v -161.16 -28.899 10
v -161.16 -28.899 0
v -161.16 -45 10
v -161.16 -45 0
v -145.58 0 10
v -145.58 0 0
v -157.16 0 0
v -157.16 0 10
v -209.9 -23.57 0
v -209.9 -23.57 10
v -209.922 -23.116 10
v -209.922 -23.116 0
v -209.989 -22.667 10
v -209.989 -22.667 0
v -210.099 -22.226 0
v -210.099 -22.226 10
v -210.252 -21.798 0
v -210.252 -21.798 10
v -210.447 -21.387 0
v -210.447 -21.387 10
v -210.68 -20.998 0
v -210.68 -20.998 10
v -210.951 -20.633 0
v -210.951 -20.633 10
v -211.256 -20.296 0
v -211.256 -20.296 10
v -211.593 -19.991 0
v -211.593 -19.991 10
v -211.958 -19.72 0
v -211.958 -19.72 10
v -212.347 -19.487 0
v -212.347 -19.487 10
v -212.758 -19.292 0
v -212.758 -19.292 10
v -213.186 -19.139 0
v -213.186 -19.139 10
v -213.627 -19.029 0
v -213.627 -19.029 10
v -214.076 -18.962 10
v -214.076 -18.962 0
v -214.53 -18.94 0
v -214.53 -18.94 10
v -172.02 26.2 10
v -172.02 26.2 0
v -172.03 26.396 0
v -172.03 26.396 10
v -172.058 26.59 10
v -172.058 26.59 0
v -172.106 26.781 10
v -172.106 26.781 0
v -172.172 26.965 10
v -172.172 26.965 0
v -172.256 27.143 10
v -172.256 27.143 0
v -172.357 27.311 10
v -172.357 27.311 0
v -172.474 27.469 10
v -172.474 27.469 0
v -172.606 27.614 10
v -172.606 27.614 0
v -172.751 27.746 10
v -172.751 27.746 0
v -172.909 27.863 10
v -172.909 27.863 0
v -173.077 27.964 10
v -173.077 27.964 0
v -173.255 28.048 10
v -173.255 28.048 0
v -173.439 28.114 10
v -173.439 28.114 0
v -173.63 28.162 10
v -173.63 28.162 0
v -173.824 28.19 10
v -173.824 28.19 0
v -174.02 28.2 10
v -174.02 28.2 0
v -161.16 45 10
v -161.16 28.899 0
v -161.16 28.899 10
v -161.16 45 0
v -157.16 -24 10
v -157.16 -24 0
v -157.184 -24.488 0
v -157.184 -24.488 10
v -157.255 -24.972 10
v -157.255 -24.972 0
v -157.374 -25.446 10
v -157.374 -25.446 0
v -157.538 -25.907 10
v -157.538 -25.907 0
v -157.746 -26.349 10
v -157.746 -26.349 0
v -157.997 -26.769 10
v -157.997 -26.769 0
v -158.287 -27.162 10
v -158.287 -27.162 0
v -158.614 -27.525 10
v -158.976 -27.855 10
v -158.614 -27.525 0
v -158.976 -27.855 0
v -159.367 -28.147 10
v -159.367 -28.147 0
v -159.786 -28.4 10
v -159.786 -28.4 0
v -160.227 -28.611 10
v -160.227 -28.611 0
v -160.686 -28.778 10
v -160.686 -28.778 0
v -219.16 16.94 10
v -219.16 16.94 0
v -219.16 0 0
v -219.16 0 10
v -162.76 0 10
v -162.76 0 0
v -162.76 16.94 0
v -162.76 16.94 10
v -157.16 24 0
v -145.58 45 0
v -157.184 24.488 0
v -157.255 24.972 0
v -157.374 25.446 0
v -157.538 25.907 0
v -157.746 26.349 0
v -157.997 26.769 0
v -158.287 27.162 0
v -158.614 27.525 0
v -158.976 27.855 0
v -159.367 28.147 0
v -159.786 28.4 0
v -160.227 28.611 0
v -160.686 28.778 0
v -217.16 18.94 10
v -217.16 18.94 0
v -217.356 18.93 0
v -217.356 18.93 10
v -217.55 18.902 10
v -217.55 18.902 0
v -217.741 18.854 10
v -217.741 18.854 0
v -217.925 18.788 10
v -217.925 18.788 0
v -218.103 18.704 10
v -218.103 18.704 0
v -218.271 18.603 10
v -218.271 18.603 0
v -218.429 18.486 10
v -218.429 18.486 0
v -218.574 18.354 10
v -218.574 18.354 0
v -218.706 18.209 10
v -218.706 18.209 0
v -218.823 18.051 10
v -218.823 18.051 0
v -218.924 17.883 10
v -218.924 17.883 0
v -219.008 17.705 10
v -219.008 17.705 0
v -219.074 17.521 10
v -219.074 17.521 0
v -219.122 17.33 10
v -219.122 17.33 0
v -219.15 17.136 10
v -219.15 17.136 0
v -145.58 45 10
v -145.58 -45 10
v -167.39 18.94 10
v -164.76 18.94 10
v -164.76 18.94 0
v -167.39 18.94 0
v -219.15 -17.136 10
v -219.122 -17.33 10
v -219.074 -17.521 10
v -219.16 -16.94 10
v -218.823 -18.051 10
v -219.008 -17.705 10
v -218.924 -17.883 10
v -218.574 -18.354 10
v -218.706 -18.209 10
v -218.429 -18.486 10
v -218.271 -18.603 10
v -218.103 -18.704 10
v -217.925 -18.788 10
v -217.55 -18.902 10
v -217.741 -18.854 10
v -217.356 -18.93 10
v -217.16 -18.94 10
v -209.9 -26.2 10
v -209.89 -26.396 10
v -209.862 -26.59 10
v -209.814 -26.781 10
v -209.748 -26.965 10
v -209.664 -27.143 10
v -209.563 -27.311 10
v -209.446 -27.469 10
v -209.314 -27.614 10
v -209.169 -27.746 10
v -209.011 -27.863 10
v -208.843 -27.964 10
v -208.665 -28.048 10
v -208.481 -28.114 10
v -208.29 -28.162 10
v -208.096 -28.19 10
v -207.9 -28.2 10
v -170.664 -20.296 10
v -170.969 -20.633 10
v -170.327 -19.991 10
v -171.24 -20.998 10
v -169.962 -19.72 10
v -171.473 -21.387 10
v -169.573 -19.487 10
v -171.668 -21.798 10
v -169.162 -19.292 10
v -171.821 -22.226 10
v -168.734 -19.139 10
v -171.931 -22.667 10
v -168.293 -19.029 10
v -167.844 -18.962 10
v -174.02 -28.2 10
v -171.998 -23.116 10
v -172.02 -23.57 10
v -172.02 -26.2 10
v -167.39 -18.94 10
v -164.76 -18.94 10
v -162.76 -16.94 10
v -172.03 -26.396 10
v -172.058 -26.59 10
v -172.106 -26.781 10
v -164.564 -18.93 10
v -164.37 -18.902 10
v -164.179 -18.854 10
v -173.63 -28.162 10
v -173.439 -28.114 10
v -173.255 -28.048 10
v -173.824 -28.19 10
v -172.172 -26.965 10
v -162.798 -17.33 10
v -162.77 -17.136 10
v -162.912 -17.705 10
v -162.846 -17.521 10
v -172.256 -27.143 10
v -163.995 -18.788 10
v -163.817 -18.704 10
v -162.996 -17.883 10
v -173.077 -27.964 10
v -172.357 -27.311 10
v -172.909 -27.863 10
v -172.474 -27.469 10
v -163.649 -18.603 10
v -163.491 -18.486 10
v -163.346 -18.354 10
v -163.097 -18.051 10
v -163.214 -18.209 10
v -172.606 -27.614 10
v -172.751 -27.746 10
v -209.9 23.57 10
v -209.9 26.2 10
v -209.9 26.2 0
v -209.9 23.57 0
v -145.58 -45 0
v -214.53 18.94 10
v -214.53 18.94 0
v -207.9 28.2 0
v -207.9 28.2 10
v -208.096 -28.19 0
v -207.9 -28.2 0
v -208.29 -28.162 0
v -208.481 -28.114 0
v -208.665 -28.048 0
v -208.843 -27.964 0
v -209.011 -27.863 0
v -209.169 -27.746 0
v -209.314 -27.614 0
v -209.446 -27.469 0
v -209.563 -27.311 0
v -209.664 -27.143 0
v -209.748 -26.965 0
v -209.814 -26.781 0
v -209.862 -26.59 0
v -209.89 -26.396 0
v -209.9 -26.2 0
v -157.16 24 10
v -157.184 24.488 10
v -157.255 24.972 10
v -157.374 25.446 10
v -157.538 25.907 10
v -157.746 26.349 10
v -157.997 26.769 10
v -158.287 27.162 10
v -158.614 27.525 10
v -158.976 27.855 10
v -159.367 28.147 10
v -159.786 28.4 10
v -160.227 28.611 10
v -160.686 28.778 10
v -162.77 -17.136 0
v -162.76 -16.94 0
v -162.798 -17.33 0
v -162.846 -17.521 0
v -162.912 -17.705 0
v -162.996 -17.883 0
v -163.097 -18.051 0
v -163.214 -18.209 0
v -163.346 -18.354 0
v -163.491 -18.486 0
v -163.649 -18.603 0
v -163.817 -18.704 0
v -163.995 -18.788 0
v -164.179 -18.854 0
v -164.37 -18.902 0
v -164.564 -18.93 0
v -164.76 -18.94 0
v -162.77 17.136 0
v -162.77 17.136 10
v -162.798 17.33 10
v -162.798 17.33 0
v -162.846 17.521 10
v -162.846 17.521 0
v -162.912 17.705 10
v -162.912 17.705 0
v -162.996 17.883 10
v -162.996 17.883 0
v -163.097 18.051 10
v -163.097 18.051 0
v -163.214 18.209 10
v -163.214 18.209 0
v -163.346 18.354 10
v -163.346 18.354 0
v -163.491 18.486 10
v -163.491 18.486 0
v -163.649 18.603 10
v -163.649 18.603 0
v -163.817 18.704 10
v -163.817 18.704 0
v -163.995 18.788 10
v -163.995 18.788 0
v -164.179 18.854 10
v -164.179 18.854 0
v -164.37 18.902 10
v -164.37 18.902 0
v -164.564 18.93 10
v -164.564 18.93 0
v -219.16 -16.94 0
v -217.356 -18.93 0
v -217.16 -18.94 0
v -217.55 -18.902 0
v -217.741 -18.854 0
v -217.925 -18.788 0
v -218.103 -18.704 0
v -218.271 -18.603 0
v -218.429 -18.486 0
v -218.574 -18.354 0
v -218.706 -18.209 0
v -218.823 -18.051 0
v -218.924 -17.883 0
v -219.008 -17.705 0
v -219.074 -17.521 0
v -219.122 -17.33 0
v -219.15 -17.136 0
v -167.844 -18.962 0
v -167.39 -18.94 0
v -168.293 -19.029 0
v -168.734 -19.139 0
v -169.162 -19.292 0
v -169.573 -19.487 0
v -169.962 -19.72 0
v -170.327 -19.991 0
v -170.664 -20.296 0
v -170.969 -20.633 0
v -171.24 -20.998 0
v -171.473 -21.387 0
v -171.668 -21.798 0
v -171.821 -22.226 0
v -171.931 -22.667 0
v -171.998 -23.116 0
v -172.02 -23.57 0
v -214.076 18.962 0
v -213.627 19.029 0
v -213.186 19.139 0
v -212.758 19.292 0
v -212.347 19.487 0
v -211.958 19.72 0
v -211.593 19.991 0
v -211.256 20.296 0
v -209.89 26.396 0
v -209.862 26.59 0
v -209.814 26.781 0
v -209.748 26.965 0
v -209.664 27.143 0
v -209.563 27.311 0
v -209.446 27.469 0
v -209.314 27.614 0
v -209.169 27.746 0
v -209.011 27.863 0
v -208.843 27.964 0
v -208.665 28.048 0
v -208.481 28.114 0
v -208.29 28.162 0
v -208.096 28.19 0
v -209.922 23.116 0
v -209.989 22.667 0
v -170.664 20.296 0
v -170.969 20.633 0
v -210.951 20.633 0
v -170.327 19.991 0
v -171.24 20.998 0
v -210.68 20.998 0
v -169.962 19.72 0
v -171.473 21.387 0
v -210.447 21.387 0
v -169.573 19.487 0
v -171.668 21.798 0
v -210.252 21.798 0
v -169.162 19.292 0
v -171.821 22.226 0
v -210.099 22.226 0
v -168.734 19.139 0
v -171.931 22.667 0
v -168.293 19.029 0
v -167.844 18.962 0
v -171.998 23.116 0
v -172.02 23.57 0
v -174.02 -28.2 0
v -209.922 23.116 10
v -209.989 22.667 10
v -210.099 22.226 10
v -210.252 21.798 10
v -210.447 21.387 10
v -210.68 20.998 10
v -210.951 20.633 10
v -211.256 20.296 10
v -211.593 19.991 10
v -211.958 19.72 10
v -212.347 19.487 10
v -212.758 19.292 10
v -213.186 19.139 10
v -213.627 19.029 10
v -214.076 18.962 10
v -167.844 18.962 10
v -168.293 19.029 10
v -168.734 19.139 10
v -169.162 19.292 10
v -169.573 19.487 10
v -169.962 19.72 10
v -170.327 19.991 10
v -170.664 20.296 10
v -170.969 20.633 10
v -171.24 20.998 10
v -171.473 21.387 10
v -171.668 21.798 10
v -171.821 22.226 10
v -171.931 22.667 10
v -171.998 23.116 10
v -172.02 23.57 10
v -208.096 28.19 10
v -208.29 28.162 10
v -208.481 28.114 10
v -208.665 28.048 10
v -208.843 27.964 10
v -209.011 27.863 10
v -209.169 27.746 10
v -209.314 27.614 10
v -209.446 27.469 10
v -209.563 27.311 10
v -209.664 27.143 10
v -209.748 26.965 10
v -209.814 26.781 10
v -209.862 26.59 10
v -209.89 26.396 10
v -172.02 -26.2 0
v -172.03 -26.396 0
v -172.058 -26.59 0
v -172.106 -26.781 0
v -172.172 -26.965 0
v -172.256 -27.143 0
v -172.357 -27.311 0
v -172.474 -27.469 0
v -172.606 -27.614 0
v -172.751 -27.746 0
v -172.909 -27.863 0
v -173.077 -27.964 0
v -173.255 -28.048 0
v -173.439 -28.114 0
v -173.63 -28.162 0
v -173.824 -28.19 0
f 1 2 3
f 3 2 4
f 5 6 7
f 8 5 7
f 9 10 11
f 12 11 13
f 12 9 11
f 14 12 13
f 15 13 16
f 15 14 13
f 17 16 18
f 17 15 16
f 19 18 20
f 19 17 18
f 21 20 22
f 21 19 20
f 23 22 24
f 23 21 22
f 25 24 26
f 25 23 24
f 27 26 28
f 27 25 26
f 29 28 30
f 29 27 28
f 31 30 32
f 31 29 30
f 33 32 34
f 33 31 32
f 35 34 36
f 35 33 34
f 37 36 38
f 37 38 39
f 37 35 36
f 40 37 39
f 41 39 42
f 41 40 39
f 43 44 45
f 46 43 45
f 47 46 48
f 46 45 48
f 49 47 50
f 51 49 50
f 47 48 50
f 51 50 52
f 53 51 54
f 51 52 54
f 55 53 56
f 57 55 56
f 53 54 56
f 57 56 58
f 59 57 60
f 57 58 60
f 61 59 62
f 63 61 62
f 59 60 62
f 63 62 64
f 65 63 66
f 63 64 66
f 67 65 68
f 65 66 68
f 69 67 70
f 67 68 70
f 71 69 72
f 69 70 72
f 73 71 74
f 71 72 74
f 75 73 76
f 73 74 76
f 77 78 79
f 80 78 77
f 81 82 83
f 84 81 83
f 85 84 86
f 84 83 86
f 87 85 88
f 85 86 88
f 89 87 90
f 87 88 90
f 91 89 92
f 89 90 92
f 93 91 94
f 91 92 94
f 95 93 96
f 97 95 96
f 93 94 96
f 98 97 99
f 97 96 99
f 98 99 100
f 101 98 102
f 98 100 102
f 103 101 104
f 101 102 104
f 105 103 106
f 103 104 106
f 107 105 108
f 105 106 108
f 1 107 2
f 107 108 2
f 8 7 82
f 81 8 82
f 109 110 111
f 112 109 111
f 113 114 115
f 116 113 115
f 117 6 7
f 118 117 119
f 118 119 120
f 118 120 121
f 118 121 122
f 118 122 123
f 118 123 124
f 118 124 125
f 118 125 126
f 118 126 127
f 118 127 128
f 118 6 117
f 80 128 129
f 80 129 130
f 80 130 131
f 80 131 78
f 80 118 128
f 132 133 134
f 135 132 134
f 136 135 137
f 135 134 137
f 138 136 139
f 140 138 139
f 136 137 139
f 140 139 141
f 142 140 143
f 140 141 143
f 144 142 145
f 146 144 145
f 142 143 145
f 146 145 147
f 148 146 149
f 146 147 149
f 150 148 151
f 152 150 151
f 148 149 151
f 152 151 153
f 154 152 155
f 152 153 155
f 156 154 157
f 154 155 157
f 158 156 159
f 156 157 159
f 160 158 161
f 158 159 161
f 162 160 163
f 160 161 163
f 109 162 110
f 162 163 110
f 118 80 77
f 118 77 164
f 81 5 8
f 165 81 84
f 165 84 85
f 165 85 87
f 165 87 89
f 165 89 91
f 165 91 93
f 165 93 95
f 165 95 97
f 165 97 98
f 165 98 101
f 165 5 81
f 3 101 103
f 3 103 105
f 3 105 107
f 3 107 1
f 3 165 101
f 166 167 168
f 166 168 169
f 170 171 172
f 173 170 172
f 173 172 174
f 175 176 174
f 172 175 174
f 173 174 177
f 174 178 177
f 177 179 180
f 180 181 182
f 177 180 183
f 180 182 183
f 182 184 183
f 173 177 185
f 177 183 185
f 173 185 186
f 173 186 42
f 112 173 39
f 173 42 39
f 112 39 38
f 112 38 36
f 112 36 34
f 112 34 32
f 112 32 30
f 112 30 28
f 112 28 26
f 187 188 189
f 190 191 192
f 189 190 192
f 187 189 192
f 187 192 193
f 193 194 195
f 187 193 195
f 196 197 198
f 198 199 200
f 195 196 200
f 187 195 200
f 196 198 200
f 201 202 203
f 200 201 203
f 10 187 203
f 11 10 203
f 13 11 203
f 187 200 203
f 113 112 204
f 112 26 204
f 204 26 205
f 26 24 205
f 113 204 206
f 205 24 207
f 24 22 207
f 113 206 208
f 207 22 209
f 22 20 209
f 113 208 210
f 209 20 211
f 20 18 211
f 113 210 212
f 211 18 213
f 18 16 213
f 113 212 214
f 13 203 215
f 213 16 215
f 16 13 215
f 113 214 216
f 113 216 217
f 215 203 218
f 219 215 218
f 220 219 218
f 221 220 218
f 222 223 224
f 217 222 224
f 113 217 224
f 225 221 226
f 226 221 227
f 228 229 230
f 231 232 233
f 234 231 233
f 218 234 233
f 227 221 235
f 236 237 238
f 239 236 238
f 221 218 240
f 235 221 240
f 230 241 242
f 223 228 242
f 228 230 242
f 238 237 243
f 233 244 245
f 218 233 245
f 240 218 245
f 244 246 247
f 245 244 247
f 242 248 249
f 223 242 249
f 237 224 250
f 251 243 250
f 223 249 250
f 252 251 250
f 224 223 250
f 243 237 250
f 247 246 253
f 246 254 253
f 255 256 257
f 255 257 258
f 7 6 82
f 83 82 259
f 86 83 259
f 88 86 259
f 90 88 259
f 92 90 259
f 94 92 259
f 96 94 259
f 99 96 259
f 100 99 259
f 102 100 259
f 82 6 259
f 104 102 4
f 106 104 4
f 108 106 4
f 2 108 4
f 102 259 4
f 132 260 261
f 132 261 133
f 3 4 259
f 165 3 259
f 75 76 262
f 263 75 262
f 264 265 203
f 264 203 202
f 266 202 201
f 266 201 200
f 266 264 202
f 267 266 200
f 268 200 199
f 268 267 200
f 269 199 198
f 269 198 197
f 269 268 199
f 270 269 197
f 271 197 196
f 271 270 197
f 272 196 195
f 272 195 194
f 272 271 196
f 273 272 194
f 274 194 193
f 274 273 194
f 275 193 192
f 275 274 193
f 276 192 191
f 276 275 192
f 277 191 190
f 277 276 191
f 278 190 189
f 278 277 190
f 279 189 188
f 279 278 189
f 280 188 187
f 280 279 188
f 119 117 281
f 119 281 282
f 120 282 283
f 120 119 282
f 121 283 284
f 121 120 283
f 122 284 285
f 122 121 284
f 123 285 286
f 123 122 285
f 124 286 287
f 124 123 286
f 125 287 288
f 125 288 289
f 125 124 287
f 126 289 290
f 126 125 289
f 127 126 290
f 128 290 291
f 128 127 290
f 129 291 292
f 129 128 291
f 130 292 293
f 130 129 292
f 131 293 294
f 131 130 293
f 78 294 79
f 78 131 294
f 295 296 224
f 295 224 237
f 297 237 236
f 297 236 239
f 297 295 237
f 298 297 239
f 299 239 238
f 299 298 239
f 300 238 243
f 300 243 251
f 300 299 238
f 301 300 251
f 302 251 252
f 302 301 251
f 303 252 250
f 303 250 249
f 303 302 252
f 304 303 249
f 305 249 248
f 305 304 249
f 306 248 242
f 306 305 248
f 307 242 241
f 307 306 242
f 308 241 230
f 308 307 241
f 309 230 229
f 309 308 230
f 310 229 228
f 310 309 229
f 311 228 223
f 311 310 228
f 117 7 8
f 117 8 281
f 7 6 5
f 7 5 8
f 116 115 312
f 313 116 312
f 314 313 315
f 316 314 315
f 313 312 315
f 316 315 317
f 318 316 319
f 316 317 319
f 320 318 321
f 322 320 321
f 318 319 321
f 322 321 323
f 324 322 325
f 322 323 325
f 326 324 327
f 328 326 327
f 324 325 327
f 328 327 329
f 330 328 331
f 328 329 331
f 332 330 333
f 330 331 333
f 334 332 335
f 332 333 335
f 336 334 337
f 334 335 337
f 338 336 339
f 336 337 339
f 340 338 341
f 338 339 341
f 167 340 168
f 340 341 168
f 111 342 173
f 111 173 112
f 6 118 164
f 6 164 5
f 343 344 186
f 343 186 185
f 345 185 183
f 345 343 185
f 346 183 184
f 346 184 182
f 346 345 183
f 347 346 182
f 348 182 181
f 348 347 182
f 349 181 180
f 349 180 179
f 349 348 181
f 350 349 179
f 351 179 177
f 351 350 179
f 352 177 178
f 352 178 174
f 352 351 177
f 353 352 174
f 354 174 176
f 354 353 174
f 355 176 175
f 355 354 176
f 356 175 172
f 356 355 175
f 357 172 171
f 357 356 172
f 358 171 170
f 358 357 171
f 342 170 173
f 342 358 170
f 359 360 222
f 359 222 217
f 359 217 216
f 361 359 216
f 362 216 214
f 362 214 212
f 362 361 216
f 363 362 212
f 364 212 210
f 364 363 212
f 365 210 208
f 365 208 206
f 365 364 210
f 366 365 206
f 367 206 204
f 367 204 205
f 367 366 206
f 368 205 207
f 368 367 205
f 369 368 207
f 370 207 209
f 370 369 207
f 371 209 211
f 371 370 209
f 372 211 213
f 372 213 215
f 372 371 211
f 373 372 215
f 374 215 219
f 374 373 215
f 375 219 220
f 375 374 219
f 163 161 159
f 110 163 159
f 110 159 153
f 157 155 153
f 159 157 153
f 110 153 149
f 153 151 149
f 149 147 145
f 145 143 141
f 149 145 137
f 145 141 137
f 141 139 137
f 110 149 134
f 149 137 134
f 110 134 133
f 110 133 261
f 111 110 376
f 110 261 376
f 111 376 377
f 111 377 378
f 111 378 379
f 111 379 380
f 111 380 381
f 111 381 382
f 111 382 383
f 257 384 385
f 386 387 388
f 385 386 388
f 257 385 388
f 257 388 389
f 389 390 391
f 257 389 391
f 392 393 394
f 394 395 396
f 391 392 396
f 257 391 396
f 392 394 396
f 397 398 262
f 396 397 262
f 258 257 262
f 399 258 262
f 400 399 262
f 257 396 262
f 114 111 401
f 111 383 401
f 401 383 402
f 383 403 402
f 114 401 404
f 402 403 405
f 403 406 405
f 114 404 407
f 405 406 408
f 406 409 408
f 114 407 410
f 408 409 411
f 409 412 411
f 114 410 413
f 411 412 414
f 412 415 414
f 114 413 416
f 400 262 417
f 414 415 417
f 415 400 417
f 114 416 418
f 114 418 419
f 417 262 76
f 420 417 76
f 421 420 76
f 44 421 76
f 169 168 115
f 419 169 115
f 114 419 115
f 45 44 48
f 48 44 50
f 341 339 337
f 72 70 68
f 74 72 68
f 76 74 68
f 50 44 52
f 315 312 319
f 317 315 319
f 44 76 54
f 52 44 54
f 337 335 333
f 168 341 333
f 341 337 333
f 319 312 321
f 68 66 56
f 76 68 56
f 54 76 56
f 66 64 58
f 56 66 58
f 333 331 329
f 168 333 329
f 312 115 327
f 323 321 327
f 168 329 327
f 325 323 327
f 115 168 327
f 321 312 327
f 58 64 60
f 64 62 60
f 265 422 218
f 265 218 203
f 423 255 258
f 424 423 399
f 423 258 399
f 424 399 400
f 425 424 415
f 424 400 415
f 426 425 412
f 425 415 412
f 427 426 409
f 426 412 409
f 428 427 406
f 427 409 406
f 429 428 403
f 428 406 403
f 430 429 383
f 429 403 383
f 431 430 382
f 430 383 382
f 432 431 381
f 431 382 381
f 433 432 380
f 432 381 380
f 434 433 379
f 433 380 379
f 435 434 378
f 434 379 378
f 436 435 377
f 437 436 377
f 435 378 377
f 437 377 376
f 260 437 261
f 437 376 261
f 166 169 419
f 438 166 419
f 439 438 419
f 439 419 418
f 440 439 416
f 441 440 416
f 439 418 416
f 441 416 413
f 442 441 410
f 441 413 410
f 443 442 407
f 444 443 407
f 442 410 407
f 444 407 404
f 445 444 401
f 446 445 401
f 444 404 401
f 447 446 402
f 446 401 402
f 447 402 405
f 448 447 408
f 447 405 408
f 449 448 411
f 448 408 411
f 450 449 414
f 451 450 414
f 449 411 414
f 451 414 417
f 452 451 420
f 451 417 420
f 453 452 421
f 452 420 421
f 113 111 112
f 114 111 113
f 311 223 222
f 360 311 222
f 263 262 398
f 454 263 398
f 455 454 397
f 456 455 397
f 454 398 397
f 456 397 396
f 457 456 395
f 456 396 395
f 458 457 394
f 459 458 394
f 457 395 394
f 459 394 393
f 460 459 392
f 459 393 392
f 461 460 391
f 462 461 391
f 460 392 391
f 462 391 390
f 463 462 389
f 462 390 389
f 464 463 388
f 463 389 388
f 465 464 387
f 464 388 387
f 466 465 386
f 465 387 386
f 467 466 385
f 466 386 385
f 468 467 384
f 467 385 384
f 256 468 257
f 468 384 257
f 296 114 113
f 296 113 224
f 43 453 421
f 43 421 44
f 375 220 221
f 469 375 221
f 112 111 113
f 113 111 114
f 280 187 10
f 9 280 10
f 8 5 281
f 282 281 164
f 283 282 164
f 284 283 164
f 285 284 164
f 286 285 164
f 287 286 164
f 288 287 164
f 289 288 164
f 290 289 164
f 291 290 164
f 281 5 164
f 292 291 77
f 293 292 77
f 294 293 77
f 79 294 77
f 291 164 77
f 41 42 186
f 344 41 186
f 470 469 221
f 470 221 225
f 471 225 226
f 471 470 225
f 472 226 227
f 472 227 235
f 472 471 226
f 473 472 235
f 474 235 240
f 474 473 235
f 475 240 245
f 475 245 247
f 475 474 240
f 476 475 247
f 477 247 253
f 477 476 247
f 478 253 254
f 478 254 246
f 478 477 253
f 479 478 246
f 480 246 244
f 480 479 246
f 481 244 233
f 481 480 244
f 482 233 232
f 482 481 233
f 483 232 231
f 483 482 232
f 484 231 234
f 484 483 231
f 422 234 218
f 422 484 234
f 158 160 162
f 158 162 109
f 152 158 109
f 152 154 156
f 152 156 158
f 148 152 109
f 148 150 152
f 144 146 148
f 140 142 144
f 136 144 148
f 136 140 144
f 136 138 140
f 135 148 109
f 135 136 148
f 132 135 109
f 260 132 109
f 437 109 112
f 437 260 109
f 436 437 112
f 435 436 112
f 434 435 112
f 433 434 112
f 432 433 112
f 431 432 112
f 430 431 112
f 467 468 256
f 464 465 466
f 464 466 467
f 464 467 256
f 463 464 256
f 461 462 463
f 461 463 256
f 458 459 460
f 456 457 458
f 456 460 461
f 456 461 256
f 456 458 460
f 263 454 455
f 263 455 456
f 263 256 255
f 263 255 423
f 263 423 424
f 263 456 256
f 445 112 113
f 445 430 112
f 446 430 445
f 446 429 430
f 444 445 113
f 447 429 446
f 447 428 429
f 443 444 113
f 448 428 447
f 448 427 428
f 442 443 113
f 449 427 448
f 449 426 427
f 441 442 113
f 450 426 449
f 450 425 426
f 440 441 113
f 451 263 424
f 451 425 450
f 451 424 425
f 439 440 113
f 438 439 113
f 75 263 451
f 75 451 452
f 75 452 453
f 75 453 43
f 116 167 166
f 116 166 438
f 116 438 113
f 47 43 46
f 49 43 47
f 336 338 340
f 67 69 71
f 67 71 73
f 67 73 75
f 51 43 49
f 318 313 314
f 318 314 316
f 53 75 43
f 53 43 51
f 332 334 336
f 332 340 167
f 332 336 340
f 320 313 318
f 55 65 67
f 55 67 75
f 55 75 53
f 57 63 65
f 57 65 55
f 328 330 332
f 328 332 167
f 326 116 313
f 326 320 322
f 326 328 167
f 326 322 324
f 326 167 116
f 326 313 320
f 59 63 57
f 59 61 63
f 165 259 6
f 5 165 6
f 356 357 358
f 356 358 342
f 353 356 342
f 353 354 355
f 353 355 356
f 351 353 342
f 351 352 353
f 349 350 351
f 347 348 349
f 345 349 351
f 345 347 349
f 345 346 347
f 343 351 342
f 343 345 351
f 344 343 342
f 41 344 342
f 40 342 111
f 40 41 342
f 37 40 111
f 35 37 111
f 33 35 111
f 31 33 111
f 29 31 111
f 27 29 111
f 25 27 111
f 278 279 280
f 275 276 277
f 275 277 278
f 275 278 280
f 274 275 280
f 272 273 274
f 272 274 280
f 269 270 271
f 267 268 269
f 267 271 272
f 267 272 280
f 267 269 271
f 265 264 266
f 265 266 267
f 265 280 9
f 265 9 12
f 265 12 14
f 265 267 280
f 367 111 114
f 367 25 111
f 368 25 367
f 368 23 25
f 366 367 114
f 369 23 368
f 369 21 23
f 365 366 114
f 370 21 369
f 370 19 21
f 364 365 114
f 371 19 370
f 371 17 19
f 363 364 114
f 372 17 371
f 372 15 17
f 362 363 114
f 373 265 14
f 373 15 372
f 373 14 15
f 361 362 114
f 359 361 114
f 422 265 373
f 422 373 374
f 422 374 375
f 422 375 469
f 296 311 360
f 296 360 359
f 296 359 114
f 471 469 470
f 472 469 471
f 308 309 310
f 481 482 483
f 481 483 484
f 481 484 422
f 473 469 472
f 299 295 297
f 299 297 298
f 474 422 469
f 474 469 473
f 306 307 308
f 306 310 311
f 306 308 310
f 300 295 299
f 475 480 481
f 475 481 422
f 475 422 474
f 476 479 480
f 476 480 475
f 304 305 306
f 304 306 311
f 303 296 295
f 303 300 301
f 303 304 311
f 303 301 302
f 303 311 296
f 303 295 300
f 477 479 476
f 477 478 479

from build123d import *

# Parameters (mm, degrees)
BOSS_EXTRUDE1_DEPTH   = 10
BOSS_EXTRUDE1_2_DEPTH = 10


with BuildPart() as part:
    # Sketch1 → Boss-Extrude1 (new body)
    with BuildSketch(Plane.XY):
        with BuildLine():
            Line((-162.76, 0), (-162.76, 16.94))
            ThreePointArc((-162.76, 16.94), (-163.345786438, 18.354213562), (-164.76, 18.94))
            Line((-164.76, 18.94), (-167.39, 18.94))
            ThreePointArc((-167.39, 18.94), (-170.663904397, 20.296095603), (-172.02, 23.57))
            Line((-172.02, 23.57), (-172.02, 26.2))
            ThreePointArc((-172.02, 26.2), (-172.605786438, 27.614213562), (-174.02, 28.2))
            Line((-174.02, 28.2), (-207.9, 28.2))
            ThreePointArc((-207.9, 28.2), (-209.314213562, 27.614213562), (-209.9, 26.2))
            Line((-209.9, 26.2), (-209.9, 23.57))
            ThreePointArc((-209.9, 23.57), (-211.256095603, 20.296095603), (-214.53, 18.94))
            Line((-214.53, 18.94), (-217.16, 18.94))
            ThreePointArc((-217.16, 18.94), (-218.574213562, 18.354213562), (-219.16, 16.94))
            Line((-219.16, 16.94), (-219.16, 0))
            Line((-219.16, 0), (-162.76, 0))
        make_face()
    extrude(amount=BOSS_EXTRUDE1_DEPTH)


with BuildPart() as body_2:
    # Sketch1 → Boss-Extrude1 2 (new body)
    with BuildSketch(Plane.XY):
        with BuildLine():
            Line((-145.58, 45), (-145.58, 0))
            Line((-145.58, 0), (-157.16, 0))
            Line((-157.16, 0), (-157.16, 24))
            ThreePointArc((-157.16, 24), (-158.287016654, 27.16227766), (-161.16, 28.898979486))
            Line((-161.16, 28.898979486), (-161.16, 45))
            Line((-161.16, 45), (-151.16, 45))
            Line((-151.16, 45), (-145.58, 45))
        make_face()
    extrude(amount=BOSS_EXTRUDE1_2_DEPTH)


with BuildPart() as body_3:
    # Mirror1: mirrored copy
    add(part.part.mirror(Plane(origin=(-219.16, 0, 10), x_dir=(0, 0, 1), z_dir=(0, 1, 0))))


with BuildPart() as body_4:
    # Mirror1 2: mirrored copy
    add(body_2.part.mirror(Plane(origin=(-219.16, 0, 10), x_dir=(0, 0, 1), z_dir=(0, 1, 0))))


solid = Compound([part.part, body_2.part, body_3.part, body_4.part])
